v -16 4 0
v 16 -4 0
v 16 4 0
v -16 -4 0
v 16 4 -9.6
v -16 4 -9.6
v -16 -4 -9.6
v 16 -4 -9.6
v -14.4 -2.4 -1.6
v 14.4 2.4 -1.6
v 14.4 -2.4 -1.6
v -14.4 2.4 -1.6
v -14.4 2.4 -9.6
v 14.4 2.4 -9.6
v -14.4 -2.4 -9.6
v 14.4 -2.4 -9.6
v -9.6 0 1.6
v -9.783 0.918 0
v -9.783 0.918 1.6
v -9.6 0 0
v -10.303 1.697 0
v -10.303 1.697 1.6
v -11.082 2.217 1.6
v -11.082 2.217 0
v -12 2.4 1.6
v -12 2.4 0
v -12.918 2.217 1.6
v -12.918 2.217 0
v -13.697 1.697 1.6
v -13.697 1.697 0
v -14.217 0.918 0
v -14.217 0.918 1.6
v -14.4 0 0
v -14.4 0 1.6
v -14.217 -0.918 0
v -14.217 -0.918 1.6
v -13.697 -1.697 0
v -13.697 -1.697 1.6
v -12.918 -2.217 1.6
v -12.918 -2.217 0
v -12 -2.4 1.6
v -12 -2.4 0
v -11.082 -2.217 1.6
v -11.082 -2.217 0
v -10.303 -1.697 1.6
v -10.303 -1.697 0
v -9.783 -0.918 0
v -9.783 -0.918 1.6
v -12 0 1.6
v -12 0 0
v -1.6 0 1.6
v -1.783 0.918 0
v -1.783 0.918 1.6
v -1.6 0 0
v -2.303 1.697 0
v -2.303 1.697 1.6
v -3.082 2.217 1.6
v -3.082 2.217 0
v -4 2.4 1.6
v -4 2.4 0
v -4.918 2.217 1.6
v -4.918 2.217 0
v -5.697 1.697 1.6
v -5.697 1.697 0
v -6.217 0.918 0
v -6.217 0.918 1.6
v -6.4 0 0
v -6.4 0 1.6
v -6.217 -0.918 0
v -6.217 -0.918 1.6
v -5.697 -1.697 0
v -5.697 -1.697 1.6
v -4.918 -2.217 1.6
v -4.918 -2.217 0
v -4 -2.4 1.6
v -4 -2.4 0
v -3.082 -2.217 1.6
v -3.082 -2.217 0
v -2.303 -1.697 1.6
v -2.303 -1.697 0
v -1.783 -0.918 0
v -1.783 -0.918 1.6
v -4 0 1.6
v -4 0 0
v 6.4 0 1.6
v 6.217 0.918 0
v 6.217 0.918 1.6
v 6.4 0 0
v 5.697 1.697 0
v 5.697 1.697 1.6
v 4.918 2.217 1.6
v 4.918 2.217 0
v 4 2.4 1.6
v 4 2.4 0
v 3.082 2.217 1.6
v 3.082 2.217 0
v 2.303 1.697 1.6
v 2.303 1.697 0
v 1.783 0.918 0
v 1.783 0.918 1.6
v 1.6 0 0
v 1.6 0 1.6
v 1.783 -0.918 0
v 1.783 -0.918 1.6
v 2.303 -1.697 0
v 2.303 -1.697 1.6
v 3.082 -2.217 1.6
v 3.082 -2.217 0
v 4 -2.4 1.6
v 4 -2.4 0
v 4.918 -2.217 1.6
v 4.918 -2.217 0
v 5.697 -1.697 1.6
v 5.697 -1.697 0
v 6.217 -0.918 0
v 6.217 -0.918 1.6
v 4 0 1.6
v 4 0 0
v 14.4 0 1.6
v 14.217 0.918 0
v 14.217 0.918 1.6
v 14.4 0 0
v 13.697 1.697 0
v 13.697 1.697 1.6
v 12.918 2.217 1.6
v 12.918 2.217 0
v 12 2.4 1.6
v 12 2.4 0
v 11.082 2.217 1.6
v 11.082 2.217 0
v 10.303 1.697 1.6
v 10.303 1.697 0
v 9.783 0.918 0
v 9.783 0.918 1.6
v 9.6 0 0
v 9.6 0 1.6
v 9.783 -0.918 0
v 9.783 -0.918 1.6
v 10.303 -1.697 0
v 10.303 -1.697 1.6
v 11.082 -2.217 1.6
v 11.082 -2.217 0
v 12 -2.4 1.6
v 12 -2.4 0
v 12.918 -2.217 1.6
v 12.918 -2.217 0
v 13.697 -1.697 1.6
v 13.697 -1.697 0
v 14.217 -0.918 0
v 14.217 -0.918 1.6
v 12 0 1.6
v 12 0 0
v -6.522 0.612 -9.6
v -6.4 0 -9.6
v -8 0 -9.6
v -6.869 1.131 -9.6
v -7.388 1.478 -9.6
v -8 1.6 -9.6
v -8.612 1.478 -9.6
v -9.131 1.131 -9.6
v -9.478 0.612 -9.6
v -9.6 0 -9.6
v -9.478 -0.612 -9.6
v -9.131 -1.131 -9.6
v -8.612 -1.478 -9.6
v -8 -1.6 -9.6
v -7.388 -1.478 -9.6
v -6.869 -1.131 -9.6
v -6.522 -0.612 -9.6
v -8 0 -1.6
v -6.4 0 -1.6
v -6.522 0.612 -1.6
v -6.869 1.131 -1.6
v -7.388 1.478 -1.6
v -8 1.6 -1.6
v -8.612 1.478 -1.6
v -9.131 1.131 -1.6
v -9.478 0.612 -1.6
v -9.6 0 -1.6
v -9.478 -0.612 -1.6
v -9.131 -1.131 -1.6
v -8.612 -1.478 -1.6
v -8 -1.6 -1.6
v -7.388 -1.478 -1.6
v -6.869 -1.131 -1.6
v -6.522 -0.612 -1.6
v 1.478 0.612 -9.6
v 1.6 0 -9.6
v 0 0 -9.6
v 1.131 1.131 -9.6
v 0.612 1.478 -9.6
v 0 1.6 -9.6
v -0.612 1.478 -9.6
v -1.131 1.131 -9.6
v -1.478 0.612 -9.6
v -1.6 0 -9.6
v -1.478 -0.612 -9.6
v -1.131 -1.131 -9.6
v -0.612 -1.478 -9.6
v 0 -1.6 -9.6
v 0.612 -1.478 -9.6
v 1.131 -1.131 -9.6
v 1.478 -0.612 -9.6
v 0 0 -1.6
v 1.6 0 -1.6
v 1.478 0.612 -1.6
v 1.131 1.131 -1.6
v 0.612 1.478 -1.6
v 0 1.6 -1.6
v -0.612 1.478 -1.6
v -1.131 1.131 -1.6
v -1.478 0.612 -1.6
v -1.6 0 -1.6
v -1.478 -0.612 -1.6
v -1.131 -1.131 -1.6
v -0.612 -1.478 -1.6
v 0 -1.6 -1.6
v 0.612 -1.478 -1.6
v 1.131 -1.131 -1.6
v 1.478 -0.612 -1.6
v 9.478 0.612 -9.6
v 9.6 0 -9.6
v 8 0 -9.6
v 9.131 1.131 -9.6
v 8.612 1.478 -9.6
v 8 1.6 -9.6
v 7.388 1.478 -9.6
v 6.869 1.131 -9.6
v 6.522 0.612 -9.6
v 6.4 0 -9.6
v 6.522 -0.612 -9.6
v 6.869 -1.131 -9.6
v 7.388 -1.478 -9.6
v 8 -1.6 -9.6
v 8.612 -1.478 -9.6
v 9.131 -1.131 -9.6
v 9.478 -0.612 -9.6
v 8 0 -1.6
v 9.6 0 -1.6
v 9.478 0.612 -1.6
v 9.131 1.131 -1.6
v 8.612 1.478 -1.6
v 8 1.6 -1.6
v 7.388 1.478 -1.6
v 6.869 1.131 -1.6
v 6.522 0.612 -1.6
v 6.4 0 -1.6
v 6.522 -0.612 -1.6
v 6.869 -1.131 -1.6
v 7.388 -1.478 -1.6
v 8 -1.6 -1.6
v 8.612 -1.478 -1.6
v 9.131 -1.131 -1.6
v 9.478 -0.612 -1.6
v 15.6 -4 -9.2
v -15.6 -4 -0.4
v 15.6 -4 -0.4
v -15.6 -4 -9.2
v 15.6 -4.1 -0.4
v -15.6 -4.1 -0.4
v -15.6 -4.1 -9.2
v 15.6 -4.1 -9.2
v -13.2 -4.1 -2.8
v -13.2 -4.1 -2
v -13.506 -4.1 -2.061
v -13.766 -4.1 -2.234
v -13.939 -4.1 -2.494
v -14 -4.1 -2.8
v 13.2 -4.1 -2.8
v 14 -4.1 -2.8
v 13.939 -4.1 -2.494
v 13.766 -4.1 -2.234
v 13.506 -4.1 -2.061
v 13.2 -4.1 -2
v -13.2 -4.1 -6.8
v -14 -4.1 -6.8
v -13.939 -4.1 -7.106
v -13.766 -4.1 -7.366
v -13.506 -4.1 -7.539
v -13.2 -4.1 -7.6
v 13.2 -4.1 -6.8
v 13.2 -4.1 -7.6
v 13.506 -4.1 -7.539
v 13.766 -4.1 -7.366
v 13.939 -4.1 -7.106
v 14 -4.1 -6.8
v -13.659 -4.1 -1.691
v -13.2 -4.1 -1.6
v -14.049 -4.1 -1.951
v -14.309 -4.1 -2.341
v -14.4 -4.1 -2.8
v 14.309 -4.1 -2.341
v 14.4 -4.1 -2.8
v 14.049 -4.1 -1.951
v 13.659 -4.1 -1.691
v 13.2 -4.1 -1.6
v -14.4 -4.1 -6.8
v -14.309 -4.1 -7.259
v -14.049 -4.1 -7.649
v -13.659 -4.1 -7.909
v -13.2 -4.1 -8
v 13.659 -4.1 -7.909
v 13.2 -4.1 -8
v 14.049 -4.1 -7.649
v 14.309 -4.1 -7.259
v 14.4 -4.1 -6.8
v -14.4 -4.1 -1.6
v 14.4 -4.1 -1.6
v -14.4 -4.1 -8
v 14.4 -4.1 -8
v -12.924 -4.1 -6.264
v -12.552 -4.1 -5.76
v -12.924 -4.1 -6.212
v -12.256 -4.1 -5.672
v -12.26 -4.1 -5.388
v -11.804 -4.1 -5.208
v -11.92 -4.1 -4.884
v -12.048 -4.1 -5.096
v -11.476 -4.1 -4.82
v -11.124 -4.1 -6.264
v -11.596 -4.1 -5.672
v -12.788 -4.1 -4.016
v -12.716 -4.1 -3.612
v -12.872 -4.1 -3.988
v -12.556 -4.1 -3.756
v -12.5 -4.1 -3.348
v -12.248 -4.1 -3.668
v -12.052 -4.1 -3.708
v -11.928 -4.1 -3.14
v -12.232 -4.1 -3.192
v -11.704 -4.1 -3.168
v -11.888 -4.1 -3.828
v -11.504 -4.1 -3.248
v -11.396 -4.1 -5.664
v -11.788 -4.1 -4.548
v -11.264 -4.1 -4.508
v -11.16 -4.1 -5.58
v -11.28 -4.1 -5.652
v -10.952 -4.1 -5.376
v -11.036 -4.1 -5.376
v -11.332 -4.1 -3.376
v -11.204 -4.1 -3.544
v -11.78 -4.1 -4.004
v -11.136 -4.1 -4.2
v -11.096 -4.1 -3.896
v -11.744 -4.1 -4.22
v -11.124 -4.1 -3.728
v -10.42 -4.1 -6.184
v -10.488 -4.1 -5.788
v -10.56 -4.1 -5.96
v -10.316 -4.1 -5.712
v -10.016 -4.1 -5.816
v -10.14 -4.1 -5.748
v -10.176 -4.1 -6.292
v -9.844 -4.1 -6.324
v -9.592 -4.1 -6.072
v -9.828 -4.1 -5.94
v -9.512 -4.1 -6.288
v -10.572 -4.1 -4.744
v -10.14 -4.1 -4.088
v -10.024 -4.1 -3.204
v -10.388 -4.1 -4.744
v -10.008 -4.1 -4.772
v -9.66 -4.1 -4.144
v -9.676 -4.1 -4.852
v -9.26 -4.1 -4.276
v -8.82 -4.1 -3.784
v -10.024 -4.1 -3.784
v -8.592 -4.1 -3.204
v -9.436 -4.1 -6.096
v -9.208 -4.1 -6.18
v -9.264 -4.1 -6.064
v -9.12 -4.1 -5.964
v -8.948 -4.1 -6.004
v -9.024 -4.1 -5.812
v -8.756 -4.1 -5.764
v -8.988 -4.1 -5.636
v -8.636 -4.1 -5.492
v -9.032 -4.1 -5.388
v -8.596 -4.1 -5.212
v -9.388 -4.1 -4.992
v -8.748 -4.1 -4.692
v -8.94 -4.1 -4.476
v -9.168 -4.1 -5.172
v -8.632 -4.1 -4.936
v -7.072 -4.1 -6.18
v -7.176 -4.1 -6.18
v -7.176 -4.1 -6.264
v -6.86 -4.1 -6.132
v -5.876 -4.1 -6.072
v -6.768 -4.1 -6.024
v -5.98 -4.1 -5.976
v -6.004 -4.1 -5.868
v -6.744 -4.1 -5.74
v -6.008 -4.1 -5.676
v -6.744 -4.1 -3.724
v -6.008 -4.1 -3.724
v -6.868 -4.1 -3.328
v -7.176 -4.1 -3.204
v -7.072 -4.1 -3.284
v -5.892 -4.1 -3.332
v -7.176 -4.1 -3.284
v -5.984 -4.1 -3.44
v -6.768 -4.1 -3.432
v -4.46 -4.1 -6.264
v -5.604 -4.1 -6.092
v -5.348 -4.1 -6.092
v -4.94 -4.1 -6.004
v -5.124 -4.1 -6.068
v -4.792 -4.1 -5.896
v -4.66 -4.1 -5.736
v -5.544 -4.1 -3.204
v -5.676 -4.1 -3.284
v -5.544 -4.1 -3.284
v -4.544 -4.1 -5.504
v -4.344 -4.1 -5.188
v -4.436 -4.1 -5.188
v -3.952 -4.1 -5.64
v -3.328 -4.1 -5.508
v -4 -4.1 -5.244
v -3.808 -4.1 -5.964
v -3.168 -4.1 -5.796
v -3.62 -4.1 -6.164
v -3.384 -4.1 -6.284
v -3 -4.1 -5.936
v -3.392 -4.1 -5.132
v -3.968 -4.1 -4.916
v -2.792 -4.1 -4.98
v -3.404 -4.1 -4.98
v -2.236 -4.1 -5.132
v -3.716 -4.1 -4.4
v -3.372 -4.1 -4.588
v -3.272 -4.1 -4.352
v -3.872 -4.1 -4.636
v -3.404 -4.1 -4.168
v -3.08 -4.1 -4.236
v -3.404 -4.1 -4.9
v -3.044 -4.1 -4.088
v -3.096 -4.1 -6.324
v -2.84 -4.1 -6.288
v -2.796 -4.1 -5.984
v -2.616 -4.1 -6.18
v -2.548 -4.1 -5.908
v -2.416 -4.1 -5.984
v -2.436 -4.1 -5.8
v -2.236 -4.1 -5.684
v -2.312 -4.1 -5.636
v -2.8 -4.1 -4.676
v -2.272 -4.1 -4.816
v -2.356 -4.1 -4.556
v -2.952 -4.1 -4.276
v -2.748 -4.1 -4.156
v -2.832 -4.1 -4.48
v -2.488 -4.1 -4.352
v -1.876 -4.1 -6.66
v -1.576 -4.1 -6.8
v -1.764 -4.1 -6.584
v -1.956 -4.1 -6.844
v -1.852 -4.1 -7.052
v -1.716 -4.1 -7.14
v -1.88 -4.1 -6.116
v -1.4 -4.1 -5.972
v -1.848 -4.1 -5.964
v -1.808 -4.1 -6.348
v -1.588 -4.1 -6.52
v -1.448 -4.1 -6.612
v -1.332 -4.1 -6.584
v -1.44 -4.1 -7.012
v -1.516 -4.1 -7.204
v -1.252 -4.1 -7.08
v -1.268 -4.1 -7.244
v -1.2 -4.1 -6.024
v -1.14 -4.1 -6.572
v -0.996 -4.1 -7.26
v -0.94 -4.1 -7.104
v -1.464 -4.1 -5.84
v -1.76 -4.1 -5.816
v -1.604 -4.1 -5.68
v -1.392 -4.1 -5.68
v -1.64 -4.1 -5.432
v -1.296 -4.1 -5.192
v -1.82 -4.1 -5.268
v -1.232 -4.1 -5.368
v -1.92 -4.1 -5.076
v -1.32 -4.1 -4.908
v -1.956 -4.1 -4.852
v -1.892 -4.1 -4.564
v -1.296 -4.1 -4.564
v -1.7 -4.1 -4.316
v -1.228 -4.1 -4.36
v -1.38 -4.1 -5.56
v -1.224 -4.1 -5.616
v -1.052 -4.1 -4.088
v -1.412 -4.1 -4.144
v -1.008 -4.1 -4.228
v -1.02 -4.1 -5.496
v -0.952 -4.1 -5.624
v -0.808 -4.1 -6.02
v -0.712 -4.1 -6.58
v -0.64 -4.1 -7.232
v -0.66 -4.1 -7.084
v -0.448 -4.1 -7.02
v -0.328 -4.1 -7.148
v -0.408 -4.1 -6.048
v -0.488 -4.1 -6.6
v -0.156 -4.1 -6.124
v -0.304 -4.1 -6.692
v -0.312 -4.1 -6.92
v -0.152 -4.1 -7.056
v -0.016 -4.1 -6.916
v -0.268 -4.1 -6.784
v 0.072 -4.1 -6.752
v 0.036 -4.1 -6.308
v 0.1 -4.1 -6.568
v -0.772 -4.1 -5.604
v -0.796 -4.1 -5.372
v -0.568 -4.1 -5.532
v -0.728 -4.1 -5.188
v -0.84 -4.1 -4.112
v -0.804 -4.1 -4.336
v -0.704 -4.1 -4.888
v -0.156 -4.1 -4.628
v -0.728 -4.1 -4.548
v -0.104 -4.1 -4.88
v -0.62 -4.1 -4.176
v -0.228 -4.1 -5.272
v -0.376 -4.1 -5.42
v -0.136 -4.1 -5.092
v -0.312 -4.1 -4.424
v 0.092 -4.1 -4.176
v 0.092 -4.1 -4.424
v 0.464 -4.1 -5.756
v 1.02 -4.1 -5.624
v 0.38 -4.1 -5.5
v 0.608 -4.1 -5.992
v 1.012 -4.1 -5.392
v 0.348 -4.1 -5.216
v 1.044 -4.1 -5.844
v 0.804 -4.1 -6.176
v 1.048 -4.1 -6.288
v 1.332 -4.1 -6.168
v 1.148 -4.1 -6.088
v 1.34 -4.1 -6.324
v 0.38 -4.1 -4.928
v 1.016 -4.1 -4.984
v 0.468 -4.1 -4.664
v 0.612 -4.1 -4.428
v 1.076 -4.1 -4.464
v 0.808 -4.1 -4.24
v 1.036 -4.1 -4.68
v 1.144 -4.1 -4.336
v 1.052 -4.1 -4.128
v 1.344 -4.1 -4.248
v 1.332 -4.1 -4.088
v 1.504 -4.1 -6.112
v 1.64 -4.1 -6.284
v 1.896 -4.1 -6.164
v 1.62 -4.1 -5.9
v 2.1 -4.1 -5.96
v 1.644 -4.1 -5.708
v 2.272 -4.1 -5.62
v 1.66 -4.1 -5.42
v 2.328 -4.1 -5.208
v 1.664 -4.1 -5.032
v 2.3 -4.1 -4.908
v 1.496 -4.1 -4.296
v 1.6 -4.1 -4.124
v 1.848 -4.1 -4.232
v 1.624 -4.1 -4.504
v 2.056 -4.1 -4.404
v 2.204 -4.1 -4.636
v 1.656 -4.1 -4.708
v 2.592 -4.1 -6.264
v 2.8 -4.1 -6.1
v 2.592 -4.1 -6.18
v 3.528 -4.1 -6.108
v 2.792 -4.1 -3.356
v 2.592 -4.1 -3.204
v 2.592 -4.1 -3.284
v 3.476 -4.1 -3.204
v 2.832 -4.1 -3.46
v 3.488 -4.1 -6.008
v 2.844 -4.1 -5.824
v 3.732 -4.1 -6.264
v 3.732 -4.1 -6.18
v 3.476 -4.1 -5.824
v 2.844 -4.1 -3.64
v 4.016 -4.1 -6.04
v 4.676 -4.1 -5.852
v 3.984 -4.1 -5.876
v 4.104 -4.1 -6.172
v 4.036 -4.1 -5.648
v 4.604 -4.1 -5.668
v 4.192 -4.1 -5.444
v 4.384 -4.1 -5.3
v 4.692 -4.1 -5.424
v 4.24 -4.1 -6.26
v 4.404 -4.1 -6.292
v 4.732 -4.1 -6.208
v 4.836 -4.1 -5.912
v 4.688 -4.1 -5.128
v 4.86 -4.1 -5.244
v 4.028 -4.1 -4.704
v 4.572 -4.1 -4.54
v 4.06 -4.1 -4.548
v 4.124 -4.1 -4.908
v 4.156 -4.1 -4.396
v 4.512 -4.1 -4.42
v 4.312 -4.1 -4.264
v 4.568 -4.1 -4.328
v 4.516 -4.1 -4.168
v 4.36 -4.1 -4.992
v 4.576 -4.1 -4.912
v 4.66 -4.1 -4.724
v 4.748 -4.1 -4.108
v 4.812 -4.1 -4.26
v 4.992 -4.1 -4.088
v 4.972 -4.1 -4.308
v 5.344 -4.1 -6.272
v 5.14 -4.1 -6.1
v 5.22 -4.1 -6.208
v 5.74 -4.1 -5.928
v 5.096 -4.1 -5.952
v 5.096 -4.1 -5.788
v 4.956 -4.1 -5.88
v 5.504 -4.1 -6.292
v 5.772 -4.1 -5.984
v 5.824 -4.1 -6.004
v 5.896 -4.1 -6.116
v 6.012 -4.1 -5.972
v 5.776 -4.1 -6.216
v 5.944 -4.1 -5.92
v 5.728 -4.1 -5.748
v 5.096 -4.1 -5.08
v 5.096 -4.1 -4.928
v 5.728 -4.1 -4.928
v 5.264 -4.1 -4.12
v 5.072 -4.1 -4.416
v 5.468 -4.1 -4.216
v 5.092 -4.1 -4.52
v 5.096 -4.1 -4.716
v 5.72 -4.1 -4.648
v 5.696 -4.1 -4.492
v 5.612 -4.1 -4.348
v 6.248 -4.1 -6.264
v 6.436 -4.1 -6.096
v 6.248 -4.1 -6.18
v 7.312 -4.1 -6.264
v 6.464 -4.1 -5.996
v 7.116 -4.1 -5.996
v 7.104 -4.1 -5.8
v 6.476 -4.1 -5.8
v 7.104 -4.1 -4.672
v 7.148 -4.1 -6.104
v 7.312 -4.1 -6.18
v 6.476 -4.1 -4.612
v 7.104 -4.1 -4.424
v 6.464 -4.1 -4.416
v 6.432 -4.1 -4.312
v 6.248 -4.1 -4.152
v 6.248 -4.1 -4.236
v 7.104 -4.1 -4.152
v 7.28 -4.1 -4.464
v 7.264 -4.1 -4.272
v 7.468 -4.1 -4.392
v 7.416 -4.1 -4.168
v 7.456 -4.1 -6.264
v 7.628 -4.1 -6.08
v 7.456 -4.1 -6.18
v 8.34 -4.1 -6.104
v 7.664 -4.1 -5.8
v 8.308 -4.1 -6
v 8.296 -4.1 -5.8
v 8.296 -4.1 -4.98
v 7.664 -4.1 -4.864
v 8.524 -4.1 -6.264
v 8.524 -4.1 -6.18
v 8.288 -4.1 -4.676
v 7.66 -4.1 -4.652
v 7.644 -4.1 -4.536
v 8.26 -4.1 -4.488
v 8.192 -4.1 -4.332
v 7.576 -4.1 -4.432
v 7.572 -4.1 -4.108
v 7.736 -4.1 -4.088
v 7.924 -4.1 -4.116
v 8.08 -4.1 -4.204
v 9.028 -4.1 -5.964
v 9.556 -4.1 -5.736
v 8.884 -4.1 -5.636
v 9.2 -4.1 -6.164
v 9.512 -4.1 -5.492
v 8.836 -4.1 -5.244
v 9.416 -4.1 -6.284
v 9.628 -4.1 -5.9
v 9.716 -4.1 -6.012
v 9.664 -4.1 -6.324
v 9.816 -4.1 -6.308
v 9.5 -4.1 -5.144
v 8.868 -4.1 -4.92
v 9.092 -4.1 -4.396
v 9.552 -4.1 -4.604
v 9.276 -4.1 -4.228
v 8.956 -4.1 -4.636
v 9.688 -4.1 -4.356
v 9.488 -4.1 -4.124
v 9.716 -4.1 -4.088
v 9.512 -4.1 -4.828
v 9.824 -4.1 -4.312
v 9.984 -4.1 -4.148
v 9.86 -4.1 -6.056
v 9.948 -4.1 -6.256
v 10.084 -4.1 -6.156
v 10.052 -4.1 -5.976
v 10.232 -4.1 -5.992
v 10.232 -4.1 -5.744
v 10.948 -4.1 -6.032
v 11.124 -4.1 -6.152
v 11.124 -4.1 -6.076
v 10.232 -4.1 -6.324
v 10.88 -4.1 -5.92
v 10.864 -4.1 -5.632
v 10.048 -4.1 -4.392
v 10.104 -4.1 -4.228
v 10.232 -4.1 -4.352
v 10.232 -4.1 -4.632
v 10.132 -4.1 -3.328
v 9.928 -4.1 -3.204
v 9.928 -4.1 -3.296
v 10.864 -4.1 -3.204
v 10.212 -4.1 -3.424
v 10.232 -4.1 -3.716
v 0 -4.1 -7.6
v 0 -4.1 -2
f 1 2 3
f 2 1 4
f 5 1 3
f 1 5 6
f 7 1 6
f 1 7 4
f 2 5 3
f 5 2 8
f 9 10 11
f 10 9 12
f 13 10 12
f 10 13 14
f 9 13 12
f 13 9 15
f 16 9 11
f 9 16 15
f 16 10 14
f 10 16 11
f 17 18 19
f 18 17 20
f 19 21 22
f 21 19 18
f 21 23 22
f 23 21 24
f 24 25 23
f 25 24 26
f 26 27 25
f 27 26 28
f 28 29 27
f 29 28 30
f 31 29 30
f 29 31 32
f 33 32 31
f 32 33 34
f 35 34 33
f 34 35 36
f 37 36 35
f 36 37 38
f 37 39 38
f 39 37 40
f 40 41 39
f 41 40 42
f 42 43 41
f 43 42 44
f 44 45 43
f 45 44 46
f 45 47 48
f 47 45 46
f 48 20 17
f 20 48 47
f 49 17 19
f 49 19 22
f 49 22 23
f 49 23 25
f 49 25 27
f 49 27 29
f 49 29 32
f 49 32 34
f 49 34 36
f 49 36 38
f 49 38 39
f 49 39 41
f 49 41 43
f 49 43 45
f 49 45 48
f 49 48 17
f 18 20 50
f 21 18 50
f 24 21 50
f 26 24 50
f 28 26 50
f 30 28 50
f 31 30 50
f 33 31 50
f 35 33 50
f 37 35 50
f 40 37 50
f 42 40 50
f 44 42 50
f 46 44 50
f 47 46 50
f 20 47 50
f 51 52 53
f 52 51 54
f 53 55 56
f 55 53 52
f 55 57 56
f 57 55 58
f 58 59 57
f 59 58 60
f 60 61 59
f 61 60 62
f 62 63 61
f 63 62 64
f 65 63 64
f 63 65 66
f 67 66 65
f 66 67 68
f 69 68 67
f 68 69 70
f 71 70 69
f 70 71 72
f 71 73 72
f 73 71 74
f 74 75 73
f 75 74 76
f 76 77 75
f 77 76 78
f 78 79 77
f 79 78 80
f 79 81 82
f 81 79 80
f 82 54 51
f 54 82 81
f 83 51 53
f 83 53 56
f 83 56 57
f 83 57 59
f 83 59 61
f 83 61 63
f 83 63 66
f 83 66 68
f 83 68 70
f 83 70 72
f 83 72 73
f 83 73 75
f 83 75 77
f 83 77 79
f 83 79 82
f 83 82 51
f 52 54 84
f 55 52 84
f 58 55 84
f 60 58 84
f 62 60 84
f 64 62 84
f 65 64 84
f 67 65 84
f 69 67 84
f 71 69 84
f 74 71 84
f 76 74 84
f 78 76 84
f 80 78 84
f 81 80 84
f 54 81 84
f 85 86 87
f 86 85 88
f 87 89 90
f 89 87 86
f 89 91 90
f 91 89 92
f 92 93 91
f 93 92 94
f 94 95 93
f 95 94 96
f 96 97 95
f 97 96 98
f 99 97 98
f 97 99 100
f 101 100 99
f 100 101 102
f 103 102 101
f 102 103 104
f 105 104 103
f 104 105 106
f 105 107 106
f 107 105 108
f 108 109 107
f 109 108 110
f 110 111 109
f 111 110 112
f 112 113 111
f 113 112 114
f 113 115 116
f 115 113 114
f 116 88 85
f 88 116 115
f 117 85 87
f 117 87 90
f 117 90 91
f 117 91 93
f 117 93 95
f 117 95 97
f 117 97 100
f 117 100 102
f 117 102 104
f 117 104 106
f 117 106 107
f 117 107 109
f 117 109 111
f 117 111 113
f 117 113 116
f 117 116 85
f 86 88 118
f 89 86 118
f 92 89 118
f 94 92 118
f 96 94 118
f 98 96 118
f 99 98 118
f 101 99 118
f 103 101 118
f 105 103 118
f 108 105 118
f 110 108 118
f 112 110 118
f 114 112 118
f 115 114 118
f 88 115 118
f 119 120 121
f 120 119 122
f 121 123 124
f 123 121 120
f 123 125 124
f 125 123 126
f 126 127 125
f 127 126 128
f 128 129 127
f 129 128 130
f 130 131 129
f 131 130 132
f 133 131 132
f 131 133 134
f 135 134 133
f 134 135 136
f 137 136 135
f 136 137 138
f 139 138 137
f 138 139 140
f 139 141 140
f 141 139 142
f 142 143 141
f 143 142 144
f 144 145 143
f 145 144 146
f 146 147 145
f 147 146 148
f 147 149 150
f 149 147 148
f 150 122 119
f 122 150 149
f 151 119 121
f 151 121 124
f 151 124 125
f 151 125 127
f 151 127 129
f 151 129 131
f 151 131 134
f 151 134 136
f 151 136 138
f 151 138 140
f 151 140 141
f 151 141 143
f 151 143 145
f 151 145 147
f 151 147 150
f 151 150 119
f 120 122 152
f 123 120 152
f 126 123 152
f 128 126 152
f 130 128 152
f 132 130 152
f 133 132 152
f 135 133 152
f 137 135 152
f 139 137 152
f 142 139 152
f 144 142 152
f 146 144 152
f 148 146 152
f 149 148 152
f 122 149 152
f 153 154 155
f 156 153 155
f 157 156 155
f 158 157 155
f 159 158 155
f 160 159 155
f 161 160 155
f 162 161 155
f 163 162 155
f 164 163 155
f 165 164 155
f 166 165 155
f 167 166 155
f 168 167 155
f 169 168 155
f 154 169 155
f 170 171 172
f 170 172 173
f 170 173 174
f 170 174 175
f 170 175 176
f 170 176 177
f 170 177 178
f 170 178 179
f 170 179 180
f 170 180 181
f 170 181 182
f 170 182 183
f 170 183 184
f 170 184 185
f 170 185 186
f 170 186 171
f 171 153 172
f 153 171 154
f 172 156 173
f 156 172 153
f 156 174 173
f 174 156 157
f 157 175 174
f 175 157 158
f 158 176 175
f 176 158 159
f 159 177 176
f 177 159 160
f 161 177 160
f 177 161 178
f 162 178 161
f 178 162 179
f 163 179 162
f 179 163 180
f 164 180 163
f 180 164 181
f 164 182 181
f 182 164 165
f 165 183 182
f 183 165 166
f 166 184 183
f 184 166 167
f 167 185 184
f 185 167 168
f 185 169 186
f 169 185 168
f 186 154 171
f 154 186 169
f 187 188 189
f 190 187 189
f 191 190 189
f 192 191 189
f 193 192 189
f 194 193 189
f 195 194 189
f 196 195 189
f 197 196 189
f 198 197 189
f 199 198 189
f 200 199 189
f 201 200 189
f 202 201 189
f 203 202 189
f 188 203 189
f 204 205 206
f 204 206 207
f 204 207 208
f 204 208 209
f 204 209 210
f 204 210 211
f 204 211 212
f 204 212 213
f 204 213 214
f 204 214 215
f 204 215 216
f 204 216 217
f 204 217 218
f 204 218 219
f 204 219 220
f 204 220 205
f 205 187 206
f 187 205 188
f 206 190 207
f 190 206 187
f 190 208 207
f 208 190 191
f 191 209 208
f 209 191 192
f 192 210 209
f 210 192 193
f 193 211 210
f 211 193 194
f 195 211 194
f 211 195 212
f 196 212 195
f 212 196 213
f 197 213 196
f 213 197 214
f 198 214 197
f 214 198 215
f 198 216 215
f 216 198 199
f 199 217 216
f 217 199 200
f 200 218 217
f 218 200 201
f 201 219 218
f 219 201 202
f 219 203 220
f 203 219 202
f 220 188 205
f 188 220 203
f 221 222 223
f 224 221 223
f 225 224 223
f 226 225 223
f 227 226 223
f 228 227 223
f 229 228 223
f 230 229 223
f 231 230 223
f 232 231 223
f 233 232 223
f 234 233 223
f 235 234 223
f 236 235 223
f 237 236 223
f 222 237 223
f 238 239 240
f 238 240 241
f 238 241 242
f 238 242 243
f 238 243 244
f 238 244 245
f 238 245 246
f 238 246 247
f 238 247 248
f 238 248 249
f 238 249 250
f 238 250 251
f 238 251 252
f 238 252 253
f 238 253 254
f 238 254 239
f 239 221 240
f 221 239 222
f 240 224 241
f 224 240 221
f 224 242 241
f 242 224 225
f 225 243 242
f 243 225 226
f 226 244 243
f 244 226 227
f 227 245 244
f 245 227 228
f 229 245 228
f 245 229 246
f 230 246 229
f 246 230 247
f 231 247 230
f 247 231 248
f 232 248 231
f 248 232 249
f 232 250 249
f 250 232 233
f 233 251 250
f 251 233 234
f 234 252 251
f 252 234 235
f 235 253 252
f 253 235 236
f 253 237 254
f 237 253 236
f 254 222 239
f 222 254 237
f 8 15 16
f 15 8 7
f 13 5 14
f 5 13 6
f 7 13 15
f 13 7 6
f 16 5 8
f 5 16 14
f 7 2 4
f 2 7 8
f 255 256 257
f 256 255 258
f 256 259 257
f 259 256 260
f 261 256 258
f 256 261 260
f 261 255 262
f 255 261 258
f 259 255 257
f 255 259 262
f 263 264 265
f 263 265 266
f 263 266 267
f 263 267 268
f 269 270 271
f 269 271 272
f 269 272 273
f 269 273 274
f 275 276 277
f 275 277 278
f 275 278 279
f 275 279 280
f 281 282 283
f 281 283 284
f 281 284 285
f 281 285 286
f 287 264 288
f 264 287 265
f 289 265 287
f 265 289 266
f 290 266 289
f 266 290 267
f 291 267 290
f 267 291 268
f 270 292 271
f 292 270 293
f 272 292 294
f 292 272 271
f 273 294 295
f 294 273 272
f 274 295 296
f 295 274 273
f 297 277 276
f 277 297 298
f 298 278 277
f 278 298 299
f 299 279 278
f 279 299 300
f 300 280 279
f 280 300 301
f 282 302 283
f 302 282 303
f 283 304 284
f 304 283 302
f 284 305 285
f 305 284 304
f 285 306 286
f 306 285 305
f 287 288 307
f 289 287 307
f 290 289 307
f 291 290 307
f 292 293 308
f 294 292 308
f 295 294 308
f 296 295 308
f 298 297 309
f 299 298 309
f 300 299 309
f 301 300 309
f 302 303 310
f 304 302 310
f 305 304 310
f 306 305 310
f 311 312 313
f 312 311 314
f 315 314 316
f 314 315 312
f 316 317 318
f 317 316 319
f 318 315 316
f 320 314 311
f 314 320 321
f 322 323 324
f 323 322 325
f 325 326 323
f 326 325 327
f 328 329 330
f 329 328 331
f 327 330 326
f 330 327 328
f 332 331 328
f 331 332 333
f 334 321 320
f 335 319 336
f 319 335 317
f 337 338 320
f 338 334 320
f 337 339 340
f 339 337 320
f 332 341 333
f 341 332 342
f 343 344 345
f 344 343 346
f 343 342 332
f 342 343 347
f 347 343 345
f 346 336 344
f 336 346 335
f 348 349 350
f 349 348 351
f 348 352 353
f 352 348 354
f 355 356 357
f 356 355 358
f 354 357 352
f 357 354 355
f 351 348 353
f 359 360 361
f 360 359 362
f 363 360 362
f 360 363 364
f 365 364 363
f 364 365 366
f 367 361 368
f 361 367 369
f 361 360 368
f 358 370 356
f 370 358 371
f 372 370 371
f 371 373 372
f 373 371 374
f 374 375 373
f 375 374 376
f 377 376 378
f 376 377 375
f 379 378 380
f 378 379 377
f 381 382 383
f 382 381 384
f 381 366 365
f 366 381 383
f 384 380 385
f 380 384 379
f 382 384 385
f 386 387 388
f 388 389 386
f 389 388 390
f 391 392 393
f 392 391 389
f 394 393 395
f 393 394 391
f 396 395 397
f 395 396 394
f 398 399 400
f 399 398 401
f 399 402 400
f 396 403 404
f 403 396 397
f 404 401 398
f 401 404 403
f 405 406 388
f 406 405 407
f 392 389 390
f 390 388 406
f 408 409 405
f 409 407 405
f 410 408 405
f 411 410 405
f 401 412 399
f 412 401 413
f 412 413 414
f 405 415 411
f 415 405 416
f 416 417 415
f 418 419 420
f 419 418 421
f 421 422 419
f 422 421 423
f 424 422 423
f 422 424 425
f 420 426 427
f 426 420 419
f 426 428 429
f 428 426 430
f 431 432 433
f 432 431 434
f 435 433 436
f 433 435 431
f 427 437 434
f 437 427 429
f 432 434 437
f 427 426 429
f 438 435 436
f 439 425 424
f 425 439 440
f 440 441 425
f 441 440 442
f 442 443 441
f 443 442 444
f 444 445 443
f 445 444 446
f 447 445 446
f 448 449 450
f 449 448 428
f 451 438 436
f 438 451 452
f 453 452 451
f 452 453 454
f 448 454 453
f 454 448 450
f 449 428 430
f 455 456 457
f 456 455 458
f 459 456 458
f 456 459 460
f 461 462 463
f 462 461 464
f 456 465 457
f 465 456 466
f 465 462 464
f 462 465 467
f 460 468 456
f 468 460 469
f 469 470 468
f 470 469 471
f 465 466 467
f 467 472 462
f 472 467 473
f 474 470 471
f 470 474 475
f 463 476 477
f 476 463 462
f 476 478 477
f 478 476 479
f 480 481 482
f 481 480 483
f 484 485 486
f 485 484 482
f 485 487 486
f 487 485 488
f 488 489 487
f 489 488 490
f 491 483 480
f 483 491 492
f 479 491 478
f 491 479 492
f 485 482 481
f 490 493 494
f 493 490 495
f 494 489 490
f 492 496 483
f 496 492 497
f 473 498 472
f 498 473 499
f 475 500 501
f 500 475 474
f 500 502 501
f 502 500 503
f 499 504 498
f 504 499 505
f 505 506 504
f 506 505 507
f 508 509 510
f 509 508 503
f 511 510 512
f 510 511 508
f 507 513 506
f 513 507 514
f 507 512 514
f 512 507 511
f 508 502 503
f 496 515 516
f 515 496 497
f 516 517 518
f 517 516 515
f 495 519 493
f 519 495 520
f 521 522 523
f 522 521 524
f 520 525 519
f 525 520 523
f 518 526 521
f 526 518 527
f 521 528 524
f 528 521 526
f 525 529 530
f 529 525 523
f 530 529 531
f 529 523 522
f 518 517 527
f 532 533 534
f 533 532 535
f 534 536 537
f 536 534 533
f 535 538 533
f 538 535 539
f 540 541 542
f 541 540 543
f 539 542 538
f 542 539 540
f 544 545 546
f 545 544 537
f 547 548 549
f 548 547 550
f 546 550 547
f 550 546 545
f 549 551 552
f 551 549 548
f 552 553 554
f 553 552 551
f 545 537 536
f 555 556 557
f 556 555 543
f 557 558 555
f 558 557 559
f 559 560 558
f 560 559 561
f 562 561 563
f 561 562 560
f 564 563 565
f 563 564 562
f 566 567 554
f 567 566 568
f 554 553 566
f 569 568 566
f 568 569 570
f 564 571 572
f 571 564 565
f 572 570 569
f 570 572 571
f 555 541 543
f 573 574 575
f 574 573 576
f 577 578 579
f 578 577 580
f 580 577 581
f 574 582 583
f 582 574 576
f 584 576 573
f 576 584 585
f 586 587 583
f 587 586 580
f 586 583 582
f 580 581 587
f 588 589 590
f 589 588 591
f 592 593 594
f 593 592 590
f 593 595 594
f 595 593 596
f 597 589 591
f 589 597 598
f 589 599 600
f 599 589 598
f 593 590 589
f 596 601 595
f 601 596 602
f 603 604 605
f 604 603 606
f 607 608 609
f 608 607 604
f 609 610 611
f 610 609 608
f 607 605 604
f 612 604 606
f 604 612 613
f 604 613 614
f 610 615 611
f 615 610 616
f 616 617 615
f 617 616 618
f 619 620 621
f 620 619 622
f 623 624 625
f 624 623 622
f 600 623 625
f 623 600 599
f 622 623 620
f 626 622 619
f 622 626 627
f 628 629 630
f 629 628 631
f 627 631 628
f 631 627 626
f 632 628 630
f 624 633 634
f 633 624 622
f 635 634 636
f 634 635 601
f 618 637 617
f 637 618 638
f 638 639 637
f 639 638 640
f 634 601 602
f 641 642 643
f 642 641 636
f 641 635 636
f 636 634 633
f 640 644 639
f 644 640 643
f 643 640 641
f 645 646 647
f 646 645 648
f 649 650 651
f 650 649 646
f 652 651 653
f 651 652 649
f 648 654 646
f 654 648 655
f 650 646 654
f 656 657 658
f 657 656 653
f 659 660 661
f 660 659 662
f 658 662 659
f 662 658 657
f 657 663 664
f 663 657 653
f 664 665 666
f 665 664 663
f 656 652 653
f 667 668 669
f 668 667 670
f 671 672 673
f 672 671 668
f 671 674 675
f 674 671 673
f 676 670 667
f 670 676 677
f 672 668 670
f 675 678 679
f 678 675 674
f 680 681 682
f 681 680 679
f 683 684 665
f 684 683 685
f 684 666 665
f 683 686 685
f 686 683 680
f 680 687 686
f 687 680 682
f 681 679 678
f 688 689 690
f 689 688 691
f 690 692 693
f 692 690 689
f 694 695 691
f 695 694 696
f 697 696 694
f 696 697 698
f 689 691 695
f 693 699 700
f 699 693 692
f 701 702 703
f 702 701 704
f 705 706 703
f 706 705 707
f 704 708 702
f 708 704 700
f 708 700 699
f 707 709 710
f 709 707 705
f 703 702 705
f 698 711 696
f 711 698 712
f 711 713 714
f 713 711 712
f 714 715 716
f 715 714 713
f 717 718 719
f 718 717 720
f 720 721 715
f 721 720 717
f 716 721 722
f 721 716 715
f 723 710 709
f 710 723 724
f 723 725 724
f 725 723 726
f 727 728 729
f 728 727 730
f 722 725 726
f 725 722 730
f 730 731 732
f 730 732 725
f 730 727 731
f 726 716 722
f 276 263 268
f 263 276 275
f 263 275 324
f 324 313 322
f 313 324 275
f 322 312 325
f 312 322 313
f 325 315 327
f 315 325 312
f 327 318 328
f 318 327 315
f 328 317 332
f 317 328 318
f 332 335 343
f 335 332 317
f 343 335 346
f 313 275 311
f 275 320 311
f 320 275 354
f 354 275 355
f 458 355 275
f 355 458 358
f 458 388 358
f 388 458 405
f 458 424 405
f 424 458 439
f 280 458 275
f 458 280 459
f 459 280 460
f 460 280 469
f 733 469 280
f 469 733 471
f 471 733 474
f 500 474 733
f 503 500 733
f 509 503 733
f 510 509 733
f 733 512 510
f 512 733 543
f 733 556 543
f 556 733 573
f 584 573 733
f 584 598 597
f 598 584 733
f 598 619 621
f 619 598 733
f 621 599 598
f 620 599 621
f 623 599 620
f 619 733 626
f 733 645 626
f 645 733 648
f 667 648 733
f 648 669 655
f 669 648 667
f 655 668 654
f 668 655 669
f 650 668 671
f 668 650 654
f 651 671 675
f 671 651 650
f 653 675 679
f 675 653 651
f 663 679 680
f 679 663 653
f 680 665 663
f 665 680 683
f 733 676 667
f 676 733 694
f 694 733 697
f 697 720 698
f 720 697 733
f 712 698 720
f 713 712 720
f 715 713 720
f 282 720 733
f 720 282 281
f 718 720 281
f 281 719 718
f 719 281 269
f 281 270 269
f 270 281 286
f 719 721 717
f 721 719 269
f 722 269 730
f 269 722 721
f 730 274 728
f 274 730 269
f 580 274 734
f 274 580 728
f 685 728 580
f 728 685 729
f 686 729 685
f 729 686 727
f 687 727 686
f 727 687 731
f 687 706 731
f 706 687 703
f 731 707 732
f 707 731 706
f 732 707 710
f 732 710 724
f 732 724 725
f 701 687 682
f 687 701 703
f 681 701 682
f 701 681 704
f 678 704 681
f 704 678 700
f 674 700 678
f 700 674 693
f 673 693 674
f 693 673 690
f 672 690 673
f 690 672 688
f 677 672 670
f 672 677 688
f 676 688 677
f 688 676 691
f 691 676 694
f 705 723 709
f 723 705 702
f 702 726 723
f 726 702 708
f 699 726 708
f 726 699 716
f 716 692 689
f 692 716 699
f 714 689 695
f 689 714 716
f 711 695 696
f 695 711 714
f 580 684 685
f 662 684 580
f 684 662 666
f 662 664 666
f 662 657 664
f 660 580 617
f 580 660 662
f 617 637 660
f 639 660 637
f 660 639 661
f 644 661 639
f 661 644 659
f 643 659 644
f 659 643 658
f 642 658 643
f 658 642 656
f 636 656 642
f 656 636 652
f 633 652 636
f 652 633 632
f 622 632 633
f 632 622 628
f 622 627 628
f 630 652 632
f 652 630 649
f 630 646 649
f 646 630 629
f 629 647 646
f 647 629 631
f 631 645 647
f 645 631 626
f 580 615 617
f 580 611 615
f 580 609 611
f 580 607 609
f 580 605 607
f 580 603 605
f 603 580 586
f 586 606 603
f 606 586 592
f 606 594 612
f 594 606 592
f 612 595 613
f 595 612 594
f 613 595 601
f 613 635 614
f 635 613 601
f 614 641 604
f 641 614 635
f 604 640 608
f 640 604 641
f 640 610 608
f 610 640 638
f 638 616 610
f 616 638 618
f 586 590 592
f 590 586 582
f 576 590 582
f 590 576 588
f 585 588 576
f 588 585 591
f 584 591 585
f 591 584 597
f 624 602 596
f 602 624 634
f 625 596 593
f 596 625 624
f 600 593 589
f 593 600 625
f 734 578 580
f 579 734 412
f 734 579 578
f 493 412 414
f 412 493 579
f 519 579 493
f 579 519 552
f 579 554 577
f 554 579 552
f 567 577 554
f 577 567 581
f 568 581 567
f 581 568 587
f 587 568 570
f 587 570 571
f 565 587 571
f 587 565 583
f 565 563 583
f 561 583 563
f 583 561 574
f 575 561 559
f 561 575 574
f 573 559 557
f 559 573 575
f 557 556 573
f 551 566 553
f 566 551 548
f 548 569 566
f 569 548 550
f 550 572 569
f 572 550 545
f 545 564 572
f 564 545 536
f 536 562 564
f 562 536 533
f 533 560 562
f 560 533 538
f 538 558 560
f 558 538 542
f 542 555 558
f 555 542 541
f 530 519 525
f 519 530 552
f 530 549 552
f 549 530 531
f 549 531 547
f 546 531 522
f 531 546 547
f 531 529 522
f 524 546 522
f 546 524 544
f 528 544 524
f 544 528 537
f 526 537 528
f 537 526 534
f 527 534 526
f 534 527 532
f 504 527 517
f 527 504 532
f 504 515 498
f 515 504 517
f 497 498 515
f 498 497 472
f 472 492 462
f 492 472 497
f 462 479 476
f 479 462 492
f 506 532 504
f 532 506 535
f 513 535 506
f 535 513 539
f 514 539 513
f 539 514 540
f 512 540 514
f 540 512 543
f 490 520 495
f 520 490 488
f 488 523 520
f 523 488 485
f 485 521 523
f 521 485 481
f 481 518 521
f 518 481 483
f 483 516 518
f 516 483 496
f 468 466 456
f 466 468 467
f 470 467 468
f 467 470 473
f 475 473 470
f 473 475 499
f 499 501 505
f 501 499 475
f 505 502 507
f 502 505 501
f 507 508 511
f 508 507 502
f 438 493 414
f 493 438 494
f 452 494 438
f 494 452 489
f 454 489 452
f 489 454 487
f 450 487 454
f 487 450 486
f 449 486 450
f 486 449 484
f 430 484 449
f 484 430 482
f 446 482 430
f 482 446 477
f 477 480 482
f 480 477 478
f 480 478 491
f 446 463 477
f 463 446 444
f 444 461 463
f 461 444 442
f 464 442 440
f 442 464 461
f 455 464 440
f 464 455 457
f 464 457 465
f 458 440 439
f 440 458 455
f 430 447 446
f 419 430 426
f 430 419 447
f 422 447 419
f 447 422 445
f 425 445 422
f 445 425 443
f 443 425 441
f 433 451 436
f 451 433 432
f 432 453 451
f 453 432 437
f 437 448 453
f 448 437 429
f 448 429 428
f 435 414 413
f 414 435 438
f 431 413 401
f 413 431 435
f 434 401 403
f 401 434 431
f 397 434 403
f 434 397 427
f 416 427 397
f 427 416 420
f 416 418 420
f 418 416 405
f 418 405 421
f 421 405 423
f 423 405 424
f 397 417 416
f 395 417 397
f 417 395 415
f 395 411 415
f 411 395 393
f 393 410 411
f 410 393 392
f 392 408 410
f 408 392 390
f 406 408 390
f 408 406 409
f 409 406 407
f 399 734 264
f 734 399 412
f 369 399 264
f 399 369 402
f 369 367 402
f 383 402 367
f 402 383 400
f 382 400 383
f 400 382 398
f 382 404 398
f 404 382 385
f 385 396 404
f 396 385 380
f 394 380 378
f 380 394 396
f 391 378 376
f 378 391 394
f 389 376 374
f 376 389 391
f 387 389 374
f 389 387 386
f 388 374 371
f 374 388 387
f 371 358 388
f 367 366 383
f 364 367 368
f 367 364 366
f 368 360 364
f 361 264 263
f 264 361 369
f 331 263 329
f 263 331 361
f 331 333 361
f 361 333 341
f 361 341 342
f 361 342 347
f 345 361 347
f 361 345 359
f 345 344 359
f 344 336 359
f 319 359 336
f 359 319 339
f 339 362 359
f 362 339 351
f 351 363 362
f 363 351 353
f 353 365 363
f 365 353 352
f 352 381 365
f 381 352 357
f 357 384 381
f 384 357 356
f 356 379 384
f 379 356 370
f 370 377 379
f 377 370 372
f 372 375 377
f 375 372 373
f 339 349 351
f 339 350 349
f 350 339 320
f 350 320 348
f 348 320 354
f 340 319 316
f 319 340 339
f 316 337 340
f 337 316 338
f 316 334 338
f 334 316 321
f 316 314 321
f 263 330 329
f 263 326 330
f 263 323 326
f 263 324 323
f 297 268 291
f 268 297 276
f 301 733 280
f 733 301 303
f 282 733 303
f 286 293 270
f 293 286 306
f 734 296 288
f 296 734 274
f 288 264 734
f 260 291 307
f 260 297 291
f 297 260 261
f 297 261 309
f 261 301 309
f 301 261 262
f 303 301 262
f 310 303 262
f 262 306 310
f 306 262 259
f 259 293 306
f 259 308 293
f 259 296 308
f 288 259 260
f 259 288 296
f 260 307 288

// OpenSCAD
use <../lib.scad>
use <190295e.scad>
use <3010.scad>
function ldraw_lib__3010d05() = [
// 0 Brick  1 x  4 with Black "25 Legoland" Bus Rollsign Sticker
// 0 Name: 3010d05.dat
// 0 Author: Takeshi Takahashi [RainbowDolphin]
// 0 !LDRAW_ORG Shortcut UPDATE 2024-05
// 0 !LICENSE Licensed under CC BY 4.0 : see CAreadme.txt
// 
// 0 BFC CERTIFY CCW
  [0,"BFC","CERTIFY"],
  [0,"BFC","CCW"],
// 
// 0 !CATEGORY Sticker Shortcut
// 0 !KEYWORDS Bricklink 3010pb042, bus station, Set 379-1, Transport
// 
// 0 !HISTORY 2024-06-30 [OrionP] Official Update 2024-05
// 
// 1 16 0 0 0 1 0 0 0 1 0 0 0 1 3010.dat
  [1,16,0,0,0,1,0,0,0,1,0,0,0,1, ldraw_lib__3010()],
// 1 16 0 12 -10 1 0 0 0 0 -1 0 1 0 190295e.dat
  [1,16,0,12,-10,1,0,0,0,0,-1,0,1,0, ldraw_lib__190295e()],
];
module ldraw_lib__3010d05(step=0, col=false, unit=2/5, alt=false, line=0.2, solid=!$preview)
    makepoly(ldraw_lib__3010d05(), step=step, col=col, unit=unit, alt=alt, line=line, solid=solid);
ldraw_lib__3010d05(line=0.2);
